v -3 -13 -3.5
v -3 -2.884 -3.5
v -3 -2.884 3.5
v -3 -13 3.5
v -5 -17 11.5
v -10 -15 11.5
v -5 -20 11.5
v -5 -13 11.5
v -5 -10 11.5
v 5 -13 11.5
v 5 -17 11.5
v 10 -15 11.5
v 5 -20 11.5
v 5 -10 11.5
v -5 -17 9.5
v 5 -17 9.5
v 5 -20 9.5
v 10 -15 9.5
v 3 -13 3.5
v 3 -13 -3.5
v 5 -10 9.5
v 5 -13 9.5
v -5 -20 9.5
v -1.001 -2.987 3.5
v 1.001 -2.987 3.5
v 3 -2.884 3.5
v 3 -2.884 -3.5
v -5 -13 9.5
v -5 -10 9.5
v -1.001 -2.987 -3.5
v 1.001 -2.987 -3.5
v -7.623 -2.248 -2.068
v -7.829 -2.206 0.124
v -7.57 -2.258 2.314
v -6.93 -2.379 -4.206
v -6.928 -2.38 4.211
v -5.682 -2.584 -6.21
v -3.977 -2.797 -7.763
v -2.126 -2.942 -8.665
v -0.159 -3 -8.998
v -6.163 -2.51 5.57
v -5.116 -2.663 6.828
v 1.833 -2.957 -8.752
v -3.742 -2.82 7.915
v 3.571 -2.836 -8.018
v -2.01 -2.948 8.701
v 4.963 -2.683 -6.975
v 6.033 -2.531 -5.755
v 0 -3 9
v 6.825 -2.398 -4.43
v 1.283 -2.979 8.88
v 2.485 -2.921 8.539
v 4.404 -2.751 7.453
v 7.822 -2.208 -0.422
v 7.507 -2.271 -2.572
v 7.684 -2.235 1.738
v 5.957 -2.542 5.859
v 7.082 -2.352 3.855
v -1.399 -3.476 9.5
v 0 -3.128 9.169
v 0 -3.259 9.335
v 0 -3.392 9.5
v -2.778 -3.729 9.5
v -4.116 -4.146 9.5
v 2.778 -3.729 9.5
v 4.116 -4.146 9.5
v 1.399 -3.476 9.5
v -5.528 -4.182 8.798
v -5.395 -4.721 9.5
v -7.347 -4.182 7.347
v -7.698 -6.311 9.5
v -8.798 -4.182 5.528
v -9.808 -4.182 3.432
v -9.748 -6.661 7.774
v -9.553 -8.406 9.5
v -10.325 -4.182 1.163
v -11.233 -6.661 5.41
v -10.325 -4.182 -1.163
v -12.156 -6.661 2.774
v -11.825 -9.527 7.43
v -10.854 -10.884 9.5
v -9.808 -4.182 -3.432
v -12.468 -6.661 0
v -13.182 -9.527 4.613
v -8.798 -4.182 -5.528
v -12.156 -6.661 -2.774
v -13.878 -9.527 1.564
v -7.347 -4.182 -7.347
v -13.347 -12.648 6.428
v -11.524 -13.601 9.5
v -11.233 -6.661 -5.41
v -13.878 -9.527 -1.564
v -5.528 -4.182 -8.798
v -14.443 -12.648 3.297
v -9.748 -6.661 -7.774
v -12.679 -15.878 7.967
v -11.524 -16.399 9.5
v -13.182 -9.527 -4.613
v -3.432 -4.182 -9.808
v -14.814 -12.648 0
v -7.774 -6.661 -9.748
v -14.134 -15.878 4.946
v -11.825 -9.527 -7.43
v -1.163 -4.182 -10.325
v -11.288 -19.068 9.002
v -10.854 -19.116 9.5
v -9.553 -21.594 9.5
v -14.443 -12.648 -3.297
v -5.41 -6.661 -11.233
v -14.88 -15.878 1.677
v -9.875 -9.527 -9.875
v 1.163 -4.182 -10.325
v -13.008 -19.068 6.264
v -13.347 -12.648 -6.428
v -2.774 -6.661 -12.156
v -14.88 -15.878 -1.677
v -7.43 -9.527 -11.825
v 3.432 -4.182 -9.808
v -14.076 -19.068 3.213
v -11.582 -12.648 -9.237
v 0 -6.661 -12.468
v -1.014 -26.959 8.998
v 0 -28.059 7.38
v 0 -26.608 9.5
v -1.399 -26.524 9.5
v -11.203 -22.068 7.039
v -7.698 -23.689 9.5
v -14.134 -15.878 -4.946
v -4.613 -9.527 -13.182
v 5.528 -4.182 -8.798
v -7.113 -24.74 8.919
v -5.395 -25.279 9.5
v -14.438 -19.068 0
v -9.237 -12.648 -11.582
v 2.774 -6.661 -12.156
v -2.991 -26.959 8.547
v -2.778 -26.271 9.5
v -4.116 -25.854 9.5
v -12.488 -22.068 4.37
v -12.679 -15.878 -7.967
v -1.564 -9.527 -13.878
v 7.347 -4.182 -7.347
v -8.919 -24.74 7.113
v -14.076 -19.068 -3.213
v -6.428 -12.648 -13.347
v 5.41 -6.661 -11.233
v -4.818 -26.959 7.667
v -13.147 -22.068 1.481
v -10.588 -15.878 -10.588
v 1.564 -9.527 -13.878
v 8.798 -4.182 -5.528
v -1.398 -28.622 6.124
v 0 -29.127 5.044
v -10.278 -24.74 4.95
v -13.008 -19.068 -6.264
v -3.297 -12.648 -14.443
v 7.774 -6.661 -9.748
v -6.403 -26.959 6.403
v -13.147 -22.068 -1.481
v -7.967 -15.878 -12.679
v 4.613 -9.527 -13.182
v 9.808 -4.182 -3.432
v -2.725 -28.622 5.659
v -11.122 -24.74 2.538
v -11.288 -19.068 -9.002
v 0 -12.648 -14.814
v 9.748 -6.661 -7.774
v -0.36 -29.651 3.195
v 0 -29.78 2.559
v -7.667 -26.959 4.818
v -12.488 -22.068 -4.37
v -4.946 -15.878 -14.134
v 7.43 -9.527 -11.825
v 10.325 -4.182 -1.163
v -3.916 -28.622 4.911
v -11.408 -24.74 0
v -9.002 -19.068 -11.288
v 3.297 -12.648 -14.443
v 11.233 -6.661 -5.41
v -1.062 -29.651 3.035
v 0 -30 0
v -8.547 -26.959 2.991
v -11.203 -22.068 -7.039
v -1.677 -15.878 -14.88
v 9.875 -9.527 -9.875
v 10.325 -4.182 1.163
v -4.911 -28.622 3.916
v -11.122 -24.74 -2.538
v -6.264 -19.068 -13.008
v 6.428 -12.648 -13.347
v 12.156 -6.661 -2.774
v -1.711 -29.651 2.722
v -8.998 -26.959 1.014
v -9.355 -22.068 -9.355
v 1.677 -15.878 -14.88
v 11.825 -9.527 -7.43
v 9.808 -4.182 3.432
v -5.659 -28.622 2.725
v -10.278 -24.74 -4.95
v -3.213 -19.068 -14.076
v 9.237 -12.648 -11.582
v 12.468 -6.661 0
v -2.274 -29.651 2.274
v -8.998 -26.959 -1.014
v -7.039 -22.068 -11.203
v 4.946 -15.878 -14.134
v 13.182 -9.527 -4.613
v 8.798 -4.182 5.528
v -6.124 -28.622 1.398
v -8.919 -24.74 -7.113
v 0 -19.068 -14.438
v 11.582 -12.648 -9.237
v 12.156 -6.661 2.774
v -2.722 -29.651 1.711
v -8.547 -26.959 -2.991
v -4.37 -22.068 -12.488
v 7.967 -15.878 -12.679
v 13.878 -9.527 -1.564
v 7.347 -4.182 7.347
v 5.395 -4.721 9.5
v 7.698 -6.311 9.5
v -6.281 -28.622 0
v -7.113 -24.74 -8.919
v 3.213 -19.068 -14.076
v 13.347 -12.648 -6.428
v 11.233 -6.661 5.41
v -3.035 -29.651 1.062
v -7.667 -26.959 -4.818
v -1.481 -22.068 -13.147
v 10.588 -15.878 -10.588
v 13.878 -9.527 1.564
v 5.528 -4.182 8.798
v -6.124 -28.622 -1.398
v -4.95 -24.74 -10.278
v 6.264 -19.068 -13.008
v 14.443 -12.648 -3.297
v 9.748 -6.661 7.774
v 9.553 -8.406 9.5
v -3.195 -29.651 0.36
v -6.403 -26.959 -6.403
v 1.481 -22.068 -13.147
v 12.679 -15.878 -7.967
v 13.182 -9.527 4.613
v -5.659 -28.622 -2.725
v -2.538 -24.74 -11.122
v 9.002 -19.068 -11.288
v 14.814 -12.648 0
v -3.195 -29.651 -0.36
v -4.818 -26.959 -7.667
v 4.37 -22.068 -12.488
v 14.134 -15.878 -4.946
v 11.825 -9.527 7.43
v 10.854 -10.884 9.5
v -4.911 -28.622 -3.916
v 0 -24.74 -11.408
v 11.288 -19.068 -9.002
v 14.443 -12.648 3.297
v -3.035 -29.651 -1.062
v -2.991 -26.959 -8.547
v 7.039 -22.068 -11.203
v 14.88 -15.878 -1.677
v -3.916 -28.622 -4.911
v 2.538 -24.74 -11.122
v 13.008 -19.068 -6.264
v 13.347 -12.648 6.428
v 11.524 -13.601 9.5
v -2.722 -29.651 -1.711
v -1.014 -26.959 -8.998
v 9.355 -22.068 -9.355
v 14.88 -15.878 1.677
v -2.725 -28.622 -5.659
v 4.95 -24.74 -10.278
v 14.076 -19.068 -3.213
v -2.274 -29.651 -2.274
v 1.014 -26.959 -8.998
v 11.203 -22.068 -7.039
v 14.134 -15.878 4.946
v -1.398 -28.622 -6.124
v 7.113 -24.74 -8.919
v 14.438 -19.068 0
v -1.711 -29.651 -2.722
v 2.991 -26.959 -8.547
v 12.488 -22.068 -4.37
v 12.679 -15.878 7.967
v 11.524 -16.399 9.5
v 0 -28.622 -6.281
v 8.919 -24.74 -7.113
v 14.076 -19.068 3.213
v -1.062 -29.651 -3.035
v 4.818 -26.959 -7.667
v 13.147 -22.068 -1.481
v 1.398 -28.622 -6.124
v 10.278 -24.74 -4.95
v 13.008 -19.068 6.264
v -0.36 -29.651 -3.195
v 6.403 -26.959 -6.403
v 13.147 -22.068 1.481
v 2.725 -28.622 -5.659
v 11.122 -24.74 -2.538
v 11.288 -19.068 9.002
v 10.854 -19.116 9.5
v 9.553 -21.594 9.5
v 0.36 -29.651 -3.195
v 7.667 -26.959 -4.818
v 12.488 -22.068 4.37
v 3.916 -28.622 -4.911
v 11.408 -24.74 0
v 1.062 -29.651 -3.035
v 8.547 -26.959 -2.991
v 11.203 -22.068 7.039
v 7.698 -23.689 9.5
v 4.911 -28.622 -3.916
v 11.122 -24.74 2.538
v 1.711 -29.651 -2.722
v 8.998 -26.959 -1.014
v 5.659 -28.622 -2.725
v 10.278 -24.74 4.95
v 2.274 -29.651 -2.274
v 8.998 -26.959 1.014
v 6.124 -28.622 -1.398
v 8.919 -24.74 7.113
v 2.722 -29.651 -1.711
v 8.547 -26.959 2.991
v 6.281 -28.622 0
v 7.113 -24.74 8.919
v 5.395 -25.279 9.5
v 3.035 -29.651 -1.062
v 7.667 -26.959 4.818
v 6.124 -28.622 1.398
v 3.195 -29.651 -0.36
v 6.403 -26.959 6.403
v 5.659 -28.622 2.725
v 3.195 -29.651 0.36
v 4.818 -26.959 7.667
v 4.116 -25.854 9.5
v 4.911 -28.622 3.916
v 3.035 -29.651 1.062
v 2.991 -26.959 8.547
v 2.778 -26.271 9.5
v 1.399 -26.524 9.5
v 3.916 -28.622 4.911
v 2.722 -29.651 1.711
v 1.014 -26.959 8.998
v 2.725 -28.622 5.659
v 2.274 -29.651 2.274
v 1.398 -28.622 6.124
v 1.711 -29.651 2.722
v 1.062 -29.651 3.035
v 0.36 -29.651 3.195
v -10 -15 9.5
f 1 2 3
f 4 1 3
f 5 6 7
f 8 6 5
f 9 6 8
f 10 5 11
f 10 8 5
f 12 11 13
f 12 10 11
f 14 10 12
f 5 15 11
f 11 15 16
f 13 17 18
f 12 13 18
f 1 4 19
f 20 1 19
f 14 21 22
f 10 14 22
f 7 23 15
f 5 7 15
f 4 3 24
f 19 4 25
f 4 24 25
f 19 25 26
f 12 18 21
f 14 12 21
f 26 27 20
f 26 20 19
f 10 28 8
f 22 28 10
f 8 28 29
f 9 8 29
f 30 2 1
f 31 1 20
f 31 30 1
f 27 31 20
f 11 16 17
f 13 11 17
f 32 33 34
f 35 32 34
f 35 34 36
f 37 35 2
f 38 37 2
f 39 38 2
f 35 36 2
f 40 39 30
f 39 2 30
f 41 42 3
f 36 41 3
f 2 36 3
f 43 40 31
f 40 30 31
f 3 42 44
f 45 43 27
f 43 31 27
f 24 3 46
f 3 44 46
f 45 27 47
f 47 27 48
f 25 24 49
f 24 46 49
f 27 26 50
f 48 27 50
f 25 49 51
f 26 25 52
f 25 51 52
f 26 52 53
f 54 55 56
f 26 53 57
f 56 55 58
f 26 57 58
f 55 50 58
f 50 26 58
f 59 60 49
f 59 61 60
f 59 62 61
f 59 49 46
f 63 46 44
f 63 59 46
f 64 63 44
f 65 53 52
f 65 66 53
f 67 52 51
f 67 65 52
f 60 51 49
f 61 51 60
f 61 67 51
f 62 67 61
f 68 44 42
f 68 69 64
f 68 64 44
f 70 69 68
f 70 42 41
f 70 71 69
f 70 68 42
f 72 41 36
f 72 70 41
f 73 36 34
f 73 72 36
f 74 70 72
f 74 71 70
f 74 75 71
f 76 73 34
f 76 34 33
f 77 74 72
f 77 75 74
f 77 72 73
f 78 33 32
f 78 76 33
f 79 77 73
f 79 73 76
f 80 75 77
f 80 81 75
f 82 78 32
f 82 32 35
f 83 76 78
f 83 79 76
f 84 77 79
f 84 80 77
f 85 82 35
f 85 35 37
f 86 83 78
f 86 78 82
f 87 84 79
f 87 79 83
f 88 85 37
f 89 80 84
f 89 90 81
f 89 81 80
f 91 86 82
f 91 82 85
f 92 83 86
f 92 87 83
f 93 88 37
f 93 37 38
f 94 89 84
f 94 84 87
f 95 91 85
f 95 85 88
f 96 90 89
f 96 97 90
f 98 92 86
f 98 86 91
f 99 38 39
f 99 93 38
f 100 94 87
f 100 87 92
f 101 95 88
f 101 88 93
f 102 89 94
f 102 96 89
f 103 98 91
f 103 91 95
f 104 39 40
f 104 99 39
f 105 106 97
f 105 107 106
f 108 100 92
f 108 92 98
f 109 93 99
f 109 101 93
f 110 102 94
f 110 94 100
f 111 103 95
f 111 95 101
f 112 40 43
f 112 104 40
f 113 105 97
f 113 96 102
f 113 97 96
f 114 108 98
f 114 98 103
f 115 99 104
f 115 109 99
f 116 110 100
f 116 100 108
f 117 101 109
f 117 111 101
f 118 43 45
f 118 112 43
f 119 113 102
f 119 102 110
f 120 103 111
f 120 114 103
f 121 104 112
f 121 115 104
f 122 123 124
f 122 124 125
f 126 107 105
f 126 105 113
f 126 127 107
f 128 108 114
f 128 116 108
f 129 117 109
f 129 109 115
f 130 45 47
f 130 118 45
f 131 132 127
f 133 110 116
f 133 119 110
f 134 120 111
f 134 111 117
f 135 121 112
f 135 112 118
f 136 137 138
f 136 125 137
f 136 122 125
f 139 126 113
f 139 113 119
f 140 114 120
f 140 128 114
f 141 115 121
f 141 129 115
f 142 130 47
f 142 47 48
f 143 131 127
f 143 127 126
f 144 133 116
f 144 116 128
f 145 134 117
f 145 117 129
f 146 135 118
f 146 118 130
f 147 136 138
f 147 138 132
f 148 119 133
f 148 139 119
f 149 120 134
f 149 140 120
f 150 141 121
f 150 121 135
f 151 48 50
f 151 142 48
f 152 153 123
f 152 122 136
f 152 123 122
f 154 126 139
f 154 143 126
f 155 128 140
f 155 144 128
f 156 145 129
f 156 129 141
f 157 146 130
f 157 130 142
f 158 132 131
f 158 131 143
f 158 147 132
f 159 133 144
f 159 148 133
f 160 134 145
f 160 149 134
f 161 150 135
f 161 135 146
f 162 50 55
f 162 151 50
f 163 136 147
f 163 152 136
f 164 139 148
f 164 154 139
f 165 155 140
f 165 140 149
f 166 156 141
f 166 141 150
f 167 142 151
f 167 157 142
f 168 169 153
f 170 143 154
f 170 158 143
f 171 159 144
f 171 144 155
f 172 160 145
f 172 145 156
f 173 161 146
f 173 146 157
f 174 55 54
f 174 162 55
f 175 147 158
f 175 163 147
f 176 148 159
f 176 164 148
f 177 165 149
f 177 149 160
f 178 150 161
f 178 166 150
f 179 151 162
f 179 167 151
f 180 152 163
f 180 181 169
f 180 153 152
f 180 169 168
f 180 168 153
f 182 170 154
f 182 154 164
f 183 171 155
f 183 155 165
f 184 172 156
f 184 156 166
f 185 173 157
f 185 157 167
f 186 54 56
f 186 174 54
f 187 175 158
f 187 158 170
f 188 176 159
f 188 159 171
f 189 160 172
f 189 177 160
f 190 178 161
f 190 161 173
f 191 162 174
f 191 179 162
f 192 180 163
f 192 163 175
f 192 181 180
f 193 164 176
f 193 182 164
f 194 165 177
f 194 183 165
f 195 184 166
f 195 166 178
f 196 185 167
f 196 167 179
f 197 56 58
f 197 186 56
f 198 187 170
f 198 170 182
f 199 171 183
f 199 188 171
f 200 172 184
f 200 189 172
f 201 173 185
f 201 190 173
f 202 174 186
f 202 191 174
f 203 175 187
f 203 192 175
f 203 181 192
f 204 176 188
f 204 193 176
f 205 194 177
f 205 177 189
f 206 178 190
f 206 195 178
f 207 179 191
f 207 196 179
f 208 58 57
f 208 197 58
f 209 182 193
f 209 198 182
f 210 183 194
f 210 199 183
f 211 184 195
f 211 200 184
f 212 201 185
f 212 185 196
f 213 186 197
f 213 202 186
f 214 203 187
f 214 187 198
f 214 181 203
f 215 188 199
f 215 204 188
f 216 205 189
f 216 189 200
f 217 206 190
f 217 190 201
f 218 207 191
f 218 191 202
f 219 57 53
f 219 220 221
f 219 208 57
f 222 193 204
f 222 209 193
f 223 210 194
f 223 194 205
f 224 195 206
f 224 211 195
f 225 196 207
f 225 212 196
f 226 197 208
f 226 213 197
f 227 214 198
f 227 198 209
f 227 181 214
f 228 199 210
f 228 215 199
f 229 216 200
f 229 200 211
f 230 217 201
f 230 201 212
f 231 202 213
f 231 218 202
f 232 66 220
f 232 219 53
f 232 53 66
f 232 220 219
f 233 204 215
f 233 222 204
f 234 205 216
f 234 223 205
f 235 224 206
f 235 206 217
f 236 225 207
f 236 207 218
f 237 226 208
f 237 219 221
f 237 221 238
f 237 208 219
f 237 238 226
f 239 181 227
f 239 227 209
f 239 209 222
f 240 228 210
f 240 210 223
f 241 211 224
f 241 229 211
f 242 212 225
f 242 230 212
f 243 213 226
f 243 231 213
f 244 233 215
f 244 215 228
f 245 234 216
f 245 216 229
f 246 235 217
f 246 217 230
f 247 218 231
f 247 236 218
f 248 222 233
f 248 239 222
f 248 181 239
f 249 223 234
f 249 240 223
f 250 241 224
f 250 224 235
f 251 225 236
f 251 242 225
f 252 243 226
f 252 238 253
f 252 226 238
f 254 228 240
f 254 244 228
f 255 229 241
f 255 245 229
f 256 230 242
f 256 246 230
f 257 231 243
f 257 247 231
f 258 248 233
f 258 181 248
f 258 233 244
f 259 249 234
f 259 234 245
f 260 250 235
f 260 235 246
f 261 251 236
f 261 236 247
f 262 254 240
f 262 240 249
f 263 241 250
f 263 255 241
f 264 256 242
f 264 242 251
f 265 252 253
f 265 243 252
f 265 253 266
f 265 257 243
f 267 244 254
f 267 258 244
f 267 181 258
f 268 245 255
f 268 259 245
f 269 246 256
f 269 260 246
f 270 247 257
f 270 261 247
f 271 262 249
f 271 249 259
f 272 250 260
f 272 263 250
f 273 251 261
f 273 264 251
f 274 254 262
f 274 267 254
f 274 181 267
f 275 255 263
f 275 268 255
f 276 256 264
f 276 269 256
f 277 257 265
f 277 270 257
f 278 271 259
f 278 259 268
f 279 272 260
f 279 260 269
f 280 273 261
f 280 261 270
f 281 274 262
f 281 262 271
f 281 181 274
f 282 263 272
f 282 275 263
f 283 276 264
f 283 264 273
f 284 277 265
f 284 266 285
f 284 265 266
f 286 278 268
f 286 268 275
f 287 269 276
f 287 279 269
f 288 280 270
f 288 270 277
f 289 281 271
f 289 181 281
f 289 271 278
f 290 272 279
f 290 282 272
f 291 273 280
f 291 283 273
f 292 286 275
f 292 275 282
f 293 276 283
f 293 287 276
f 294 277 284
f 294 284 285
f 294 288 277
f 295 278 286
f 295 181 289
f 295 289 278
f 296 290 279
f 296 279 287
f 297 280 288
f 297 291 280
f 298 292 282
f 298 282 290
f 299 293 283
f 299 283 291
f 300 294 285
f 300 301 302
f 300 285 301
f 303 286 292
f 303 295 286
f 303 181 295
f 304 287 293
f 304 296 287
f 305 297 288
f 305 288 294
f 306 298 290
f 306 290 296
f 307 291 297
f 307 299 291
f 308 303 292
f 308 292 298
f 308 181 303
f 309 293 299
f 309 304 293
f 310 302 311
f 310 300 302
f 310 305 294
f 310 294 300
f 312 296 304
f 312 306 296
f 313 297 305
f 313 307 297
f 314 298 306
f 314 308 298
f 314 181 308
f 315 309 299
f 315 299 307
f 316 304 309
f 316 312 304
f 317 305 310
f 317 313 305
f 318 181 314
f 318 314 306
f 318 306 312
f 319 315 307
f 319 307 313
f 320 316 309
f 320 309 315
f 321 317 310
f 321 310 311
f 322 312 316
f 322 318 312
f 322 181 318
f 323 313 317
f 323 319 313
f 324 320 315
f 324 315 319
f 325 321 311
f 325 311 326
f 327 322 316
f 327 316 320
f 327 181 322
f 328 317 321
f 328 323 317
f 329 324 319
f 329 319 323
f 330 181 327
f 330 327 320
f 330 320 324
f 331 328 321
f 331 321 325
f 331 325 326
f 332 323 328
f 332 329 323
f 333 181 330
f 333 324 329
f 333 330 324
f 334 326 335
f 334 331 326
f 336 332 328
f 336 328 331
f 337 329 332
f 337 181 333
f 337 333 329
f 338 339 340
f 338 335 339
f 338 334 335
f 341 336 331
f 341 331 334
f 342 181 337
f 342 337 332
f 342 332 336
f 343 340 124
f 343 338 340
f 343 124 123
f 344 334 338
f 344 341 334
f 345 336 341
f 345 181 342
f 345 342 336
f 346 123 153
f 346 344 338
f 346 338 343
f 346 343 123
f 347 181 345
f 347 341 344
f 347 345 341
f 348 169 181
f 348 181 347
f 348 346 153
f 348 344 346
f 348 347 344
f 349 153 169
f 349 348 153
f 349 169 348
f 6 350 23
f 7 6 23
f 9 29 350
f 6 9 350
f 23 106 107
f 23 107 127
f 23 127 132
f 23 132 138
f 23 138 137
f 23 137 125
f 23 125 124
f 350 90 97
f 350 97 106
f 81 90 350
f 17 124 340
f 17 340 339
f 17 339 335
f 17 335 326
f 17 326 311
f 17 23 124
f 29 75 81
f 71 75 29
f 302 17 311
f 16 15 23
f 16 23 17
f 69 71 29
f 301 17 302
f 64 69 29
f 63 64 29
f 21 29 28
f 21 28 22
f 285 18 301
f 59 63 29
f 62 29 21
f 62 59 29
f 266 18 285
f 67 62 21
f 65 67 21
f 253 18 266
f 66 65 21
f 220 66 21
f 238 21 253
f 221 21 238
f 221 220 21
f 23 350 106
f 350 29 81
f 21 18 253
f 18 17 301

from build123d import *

# Parameters (mm, degrees)
F4_DEPTH  = 30.001
F5_W      = 6
F5_H      = 7
F6_DEPTH  = 13
F7_W      = 50.3954237082
F7_H      = 8.0328645855
F8_DEPTH  = 30.001
F9_W      = 10
F9_H      = 4
F10_DEPTH = 2


with BuildPart() as f1:
    # F0 (on Right) → F1 (revolve)
    with BuildSketch(Plane.YZ):
        with BuildLine():
            Line((-30, 0), (0, 0))
            ThreePointArc((0, 0), (-15, 15), (-30, 0))
        make_face()
    revolve(axis=Axis((0, -15, 0), (0, -1, 0)))

    # F3 (on offset) → F4 (cut, through all)
    with BuildSketch(Plane.XY.offset(15)):
        with BuildLine():
            Line((15, 0), (0, 0))
            Line((0, 0), (-15, 0))
            ThreePointArc((-15, 0), (0, -3), (15, 0))
        make_face()
    extrude(amount=-F4_DEPTH, mode=Mode.SUBTRACT)

    # F5 (on Front) → F6 (cut)
    with BuildSketch(Plane.XZ):
        Rectangle(F5_W, F5_H)
    extrude(amount=F6_DEPTH, mode=Mode.SUBTRACT)

    # F7 (on Front) → F8 (cut, through all)
    with BuildSketch(Plane.XZ):
        with Locations((-1.7276192084, 13.5164322928)):
            Rectangle(F7_W, F7_H)
    extrude(amount=F8_DEPTH, mode=Mode.SUBTRACT)

    # F9 (on face) → F10 (join)
    with BuildSketch(Plane.XY.offset(9.5)):
        with Locations((0, -15)):
            Rectangle(F9_W, F9_H)
        Polygon((-5, -17), (-5, -13), (-5, -10), (-10, -15), (-5, -20), align=None)
        Polygon((5, -10), (5, -13), (5, -17), (5, -20), (10, -15), align=None)
    extrude(amount=F10_DEPTH)


solid = f1.part
